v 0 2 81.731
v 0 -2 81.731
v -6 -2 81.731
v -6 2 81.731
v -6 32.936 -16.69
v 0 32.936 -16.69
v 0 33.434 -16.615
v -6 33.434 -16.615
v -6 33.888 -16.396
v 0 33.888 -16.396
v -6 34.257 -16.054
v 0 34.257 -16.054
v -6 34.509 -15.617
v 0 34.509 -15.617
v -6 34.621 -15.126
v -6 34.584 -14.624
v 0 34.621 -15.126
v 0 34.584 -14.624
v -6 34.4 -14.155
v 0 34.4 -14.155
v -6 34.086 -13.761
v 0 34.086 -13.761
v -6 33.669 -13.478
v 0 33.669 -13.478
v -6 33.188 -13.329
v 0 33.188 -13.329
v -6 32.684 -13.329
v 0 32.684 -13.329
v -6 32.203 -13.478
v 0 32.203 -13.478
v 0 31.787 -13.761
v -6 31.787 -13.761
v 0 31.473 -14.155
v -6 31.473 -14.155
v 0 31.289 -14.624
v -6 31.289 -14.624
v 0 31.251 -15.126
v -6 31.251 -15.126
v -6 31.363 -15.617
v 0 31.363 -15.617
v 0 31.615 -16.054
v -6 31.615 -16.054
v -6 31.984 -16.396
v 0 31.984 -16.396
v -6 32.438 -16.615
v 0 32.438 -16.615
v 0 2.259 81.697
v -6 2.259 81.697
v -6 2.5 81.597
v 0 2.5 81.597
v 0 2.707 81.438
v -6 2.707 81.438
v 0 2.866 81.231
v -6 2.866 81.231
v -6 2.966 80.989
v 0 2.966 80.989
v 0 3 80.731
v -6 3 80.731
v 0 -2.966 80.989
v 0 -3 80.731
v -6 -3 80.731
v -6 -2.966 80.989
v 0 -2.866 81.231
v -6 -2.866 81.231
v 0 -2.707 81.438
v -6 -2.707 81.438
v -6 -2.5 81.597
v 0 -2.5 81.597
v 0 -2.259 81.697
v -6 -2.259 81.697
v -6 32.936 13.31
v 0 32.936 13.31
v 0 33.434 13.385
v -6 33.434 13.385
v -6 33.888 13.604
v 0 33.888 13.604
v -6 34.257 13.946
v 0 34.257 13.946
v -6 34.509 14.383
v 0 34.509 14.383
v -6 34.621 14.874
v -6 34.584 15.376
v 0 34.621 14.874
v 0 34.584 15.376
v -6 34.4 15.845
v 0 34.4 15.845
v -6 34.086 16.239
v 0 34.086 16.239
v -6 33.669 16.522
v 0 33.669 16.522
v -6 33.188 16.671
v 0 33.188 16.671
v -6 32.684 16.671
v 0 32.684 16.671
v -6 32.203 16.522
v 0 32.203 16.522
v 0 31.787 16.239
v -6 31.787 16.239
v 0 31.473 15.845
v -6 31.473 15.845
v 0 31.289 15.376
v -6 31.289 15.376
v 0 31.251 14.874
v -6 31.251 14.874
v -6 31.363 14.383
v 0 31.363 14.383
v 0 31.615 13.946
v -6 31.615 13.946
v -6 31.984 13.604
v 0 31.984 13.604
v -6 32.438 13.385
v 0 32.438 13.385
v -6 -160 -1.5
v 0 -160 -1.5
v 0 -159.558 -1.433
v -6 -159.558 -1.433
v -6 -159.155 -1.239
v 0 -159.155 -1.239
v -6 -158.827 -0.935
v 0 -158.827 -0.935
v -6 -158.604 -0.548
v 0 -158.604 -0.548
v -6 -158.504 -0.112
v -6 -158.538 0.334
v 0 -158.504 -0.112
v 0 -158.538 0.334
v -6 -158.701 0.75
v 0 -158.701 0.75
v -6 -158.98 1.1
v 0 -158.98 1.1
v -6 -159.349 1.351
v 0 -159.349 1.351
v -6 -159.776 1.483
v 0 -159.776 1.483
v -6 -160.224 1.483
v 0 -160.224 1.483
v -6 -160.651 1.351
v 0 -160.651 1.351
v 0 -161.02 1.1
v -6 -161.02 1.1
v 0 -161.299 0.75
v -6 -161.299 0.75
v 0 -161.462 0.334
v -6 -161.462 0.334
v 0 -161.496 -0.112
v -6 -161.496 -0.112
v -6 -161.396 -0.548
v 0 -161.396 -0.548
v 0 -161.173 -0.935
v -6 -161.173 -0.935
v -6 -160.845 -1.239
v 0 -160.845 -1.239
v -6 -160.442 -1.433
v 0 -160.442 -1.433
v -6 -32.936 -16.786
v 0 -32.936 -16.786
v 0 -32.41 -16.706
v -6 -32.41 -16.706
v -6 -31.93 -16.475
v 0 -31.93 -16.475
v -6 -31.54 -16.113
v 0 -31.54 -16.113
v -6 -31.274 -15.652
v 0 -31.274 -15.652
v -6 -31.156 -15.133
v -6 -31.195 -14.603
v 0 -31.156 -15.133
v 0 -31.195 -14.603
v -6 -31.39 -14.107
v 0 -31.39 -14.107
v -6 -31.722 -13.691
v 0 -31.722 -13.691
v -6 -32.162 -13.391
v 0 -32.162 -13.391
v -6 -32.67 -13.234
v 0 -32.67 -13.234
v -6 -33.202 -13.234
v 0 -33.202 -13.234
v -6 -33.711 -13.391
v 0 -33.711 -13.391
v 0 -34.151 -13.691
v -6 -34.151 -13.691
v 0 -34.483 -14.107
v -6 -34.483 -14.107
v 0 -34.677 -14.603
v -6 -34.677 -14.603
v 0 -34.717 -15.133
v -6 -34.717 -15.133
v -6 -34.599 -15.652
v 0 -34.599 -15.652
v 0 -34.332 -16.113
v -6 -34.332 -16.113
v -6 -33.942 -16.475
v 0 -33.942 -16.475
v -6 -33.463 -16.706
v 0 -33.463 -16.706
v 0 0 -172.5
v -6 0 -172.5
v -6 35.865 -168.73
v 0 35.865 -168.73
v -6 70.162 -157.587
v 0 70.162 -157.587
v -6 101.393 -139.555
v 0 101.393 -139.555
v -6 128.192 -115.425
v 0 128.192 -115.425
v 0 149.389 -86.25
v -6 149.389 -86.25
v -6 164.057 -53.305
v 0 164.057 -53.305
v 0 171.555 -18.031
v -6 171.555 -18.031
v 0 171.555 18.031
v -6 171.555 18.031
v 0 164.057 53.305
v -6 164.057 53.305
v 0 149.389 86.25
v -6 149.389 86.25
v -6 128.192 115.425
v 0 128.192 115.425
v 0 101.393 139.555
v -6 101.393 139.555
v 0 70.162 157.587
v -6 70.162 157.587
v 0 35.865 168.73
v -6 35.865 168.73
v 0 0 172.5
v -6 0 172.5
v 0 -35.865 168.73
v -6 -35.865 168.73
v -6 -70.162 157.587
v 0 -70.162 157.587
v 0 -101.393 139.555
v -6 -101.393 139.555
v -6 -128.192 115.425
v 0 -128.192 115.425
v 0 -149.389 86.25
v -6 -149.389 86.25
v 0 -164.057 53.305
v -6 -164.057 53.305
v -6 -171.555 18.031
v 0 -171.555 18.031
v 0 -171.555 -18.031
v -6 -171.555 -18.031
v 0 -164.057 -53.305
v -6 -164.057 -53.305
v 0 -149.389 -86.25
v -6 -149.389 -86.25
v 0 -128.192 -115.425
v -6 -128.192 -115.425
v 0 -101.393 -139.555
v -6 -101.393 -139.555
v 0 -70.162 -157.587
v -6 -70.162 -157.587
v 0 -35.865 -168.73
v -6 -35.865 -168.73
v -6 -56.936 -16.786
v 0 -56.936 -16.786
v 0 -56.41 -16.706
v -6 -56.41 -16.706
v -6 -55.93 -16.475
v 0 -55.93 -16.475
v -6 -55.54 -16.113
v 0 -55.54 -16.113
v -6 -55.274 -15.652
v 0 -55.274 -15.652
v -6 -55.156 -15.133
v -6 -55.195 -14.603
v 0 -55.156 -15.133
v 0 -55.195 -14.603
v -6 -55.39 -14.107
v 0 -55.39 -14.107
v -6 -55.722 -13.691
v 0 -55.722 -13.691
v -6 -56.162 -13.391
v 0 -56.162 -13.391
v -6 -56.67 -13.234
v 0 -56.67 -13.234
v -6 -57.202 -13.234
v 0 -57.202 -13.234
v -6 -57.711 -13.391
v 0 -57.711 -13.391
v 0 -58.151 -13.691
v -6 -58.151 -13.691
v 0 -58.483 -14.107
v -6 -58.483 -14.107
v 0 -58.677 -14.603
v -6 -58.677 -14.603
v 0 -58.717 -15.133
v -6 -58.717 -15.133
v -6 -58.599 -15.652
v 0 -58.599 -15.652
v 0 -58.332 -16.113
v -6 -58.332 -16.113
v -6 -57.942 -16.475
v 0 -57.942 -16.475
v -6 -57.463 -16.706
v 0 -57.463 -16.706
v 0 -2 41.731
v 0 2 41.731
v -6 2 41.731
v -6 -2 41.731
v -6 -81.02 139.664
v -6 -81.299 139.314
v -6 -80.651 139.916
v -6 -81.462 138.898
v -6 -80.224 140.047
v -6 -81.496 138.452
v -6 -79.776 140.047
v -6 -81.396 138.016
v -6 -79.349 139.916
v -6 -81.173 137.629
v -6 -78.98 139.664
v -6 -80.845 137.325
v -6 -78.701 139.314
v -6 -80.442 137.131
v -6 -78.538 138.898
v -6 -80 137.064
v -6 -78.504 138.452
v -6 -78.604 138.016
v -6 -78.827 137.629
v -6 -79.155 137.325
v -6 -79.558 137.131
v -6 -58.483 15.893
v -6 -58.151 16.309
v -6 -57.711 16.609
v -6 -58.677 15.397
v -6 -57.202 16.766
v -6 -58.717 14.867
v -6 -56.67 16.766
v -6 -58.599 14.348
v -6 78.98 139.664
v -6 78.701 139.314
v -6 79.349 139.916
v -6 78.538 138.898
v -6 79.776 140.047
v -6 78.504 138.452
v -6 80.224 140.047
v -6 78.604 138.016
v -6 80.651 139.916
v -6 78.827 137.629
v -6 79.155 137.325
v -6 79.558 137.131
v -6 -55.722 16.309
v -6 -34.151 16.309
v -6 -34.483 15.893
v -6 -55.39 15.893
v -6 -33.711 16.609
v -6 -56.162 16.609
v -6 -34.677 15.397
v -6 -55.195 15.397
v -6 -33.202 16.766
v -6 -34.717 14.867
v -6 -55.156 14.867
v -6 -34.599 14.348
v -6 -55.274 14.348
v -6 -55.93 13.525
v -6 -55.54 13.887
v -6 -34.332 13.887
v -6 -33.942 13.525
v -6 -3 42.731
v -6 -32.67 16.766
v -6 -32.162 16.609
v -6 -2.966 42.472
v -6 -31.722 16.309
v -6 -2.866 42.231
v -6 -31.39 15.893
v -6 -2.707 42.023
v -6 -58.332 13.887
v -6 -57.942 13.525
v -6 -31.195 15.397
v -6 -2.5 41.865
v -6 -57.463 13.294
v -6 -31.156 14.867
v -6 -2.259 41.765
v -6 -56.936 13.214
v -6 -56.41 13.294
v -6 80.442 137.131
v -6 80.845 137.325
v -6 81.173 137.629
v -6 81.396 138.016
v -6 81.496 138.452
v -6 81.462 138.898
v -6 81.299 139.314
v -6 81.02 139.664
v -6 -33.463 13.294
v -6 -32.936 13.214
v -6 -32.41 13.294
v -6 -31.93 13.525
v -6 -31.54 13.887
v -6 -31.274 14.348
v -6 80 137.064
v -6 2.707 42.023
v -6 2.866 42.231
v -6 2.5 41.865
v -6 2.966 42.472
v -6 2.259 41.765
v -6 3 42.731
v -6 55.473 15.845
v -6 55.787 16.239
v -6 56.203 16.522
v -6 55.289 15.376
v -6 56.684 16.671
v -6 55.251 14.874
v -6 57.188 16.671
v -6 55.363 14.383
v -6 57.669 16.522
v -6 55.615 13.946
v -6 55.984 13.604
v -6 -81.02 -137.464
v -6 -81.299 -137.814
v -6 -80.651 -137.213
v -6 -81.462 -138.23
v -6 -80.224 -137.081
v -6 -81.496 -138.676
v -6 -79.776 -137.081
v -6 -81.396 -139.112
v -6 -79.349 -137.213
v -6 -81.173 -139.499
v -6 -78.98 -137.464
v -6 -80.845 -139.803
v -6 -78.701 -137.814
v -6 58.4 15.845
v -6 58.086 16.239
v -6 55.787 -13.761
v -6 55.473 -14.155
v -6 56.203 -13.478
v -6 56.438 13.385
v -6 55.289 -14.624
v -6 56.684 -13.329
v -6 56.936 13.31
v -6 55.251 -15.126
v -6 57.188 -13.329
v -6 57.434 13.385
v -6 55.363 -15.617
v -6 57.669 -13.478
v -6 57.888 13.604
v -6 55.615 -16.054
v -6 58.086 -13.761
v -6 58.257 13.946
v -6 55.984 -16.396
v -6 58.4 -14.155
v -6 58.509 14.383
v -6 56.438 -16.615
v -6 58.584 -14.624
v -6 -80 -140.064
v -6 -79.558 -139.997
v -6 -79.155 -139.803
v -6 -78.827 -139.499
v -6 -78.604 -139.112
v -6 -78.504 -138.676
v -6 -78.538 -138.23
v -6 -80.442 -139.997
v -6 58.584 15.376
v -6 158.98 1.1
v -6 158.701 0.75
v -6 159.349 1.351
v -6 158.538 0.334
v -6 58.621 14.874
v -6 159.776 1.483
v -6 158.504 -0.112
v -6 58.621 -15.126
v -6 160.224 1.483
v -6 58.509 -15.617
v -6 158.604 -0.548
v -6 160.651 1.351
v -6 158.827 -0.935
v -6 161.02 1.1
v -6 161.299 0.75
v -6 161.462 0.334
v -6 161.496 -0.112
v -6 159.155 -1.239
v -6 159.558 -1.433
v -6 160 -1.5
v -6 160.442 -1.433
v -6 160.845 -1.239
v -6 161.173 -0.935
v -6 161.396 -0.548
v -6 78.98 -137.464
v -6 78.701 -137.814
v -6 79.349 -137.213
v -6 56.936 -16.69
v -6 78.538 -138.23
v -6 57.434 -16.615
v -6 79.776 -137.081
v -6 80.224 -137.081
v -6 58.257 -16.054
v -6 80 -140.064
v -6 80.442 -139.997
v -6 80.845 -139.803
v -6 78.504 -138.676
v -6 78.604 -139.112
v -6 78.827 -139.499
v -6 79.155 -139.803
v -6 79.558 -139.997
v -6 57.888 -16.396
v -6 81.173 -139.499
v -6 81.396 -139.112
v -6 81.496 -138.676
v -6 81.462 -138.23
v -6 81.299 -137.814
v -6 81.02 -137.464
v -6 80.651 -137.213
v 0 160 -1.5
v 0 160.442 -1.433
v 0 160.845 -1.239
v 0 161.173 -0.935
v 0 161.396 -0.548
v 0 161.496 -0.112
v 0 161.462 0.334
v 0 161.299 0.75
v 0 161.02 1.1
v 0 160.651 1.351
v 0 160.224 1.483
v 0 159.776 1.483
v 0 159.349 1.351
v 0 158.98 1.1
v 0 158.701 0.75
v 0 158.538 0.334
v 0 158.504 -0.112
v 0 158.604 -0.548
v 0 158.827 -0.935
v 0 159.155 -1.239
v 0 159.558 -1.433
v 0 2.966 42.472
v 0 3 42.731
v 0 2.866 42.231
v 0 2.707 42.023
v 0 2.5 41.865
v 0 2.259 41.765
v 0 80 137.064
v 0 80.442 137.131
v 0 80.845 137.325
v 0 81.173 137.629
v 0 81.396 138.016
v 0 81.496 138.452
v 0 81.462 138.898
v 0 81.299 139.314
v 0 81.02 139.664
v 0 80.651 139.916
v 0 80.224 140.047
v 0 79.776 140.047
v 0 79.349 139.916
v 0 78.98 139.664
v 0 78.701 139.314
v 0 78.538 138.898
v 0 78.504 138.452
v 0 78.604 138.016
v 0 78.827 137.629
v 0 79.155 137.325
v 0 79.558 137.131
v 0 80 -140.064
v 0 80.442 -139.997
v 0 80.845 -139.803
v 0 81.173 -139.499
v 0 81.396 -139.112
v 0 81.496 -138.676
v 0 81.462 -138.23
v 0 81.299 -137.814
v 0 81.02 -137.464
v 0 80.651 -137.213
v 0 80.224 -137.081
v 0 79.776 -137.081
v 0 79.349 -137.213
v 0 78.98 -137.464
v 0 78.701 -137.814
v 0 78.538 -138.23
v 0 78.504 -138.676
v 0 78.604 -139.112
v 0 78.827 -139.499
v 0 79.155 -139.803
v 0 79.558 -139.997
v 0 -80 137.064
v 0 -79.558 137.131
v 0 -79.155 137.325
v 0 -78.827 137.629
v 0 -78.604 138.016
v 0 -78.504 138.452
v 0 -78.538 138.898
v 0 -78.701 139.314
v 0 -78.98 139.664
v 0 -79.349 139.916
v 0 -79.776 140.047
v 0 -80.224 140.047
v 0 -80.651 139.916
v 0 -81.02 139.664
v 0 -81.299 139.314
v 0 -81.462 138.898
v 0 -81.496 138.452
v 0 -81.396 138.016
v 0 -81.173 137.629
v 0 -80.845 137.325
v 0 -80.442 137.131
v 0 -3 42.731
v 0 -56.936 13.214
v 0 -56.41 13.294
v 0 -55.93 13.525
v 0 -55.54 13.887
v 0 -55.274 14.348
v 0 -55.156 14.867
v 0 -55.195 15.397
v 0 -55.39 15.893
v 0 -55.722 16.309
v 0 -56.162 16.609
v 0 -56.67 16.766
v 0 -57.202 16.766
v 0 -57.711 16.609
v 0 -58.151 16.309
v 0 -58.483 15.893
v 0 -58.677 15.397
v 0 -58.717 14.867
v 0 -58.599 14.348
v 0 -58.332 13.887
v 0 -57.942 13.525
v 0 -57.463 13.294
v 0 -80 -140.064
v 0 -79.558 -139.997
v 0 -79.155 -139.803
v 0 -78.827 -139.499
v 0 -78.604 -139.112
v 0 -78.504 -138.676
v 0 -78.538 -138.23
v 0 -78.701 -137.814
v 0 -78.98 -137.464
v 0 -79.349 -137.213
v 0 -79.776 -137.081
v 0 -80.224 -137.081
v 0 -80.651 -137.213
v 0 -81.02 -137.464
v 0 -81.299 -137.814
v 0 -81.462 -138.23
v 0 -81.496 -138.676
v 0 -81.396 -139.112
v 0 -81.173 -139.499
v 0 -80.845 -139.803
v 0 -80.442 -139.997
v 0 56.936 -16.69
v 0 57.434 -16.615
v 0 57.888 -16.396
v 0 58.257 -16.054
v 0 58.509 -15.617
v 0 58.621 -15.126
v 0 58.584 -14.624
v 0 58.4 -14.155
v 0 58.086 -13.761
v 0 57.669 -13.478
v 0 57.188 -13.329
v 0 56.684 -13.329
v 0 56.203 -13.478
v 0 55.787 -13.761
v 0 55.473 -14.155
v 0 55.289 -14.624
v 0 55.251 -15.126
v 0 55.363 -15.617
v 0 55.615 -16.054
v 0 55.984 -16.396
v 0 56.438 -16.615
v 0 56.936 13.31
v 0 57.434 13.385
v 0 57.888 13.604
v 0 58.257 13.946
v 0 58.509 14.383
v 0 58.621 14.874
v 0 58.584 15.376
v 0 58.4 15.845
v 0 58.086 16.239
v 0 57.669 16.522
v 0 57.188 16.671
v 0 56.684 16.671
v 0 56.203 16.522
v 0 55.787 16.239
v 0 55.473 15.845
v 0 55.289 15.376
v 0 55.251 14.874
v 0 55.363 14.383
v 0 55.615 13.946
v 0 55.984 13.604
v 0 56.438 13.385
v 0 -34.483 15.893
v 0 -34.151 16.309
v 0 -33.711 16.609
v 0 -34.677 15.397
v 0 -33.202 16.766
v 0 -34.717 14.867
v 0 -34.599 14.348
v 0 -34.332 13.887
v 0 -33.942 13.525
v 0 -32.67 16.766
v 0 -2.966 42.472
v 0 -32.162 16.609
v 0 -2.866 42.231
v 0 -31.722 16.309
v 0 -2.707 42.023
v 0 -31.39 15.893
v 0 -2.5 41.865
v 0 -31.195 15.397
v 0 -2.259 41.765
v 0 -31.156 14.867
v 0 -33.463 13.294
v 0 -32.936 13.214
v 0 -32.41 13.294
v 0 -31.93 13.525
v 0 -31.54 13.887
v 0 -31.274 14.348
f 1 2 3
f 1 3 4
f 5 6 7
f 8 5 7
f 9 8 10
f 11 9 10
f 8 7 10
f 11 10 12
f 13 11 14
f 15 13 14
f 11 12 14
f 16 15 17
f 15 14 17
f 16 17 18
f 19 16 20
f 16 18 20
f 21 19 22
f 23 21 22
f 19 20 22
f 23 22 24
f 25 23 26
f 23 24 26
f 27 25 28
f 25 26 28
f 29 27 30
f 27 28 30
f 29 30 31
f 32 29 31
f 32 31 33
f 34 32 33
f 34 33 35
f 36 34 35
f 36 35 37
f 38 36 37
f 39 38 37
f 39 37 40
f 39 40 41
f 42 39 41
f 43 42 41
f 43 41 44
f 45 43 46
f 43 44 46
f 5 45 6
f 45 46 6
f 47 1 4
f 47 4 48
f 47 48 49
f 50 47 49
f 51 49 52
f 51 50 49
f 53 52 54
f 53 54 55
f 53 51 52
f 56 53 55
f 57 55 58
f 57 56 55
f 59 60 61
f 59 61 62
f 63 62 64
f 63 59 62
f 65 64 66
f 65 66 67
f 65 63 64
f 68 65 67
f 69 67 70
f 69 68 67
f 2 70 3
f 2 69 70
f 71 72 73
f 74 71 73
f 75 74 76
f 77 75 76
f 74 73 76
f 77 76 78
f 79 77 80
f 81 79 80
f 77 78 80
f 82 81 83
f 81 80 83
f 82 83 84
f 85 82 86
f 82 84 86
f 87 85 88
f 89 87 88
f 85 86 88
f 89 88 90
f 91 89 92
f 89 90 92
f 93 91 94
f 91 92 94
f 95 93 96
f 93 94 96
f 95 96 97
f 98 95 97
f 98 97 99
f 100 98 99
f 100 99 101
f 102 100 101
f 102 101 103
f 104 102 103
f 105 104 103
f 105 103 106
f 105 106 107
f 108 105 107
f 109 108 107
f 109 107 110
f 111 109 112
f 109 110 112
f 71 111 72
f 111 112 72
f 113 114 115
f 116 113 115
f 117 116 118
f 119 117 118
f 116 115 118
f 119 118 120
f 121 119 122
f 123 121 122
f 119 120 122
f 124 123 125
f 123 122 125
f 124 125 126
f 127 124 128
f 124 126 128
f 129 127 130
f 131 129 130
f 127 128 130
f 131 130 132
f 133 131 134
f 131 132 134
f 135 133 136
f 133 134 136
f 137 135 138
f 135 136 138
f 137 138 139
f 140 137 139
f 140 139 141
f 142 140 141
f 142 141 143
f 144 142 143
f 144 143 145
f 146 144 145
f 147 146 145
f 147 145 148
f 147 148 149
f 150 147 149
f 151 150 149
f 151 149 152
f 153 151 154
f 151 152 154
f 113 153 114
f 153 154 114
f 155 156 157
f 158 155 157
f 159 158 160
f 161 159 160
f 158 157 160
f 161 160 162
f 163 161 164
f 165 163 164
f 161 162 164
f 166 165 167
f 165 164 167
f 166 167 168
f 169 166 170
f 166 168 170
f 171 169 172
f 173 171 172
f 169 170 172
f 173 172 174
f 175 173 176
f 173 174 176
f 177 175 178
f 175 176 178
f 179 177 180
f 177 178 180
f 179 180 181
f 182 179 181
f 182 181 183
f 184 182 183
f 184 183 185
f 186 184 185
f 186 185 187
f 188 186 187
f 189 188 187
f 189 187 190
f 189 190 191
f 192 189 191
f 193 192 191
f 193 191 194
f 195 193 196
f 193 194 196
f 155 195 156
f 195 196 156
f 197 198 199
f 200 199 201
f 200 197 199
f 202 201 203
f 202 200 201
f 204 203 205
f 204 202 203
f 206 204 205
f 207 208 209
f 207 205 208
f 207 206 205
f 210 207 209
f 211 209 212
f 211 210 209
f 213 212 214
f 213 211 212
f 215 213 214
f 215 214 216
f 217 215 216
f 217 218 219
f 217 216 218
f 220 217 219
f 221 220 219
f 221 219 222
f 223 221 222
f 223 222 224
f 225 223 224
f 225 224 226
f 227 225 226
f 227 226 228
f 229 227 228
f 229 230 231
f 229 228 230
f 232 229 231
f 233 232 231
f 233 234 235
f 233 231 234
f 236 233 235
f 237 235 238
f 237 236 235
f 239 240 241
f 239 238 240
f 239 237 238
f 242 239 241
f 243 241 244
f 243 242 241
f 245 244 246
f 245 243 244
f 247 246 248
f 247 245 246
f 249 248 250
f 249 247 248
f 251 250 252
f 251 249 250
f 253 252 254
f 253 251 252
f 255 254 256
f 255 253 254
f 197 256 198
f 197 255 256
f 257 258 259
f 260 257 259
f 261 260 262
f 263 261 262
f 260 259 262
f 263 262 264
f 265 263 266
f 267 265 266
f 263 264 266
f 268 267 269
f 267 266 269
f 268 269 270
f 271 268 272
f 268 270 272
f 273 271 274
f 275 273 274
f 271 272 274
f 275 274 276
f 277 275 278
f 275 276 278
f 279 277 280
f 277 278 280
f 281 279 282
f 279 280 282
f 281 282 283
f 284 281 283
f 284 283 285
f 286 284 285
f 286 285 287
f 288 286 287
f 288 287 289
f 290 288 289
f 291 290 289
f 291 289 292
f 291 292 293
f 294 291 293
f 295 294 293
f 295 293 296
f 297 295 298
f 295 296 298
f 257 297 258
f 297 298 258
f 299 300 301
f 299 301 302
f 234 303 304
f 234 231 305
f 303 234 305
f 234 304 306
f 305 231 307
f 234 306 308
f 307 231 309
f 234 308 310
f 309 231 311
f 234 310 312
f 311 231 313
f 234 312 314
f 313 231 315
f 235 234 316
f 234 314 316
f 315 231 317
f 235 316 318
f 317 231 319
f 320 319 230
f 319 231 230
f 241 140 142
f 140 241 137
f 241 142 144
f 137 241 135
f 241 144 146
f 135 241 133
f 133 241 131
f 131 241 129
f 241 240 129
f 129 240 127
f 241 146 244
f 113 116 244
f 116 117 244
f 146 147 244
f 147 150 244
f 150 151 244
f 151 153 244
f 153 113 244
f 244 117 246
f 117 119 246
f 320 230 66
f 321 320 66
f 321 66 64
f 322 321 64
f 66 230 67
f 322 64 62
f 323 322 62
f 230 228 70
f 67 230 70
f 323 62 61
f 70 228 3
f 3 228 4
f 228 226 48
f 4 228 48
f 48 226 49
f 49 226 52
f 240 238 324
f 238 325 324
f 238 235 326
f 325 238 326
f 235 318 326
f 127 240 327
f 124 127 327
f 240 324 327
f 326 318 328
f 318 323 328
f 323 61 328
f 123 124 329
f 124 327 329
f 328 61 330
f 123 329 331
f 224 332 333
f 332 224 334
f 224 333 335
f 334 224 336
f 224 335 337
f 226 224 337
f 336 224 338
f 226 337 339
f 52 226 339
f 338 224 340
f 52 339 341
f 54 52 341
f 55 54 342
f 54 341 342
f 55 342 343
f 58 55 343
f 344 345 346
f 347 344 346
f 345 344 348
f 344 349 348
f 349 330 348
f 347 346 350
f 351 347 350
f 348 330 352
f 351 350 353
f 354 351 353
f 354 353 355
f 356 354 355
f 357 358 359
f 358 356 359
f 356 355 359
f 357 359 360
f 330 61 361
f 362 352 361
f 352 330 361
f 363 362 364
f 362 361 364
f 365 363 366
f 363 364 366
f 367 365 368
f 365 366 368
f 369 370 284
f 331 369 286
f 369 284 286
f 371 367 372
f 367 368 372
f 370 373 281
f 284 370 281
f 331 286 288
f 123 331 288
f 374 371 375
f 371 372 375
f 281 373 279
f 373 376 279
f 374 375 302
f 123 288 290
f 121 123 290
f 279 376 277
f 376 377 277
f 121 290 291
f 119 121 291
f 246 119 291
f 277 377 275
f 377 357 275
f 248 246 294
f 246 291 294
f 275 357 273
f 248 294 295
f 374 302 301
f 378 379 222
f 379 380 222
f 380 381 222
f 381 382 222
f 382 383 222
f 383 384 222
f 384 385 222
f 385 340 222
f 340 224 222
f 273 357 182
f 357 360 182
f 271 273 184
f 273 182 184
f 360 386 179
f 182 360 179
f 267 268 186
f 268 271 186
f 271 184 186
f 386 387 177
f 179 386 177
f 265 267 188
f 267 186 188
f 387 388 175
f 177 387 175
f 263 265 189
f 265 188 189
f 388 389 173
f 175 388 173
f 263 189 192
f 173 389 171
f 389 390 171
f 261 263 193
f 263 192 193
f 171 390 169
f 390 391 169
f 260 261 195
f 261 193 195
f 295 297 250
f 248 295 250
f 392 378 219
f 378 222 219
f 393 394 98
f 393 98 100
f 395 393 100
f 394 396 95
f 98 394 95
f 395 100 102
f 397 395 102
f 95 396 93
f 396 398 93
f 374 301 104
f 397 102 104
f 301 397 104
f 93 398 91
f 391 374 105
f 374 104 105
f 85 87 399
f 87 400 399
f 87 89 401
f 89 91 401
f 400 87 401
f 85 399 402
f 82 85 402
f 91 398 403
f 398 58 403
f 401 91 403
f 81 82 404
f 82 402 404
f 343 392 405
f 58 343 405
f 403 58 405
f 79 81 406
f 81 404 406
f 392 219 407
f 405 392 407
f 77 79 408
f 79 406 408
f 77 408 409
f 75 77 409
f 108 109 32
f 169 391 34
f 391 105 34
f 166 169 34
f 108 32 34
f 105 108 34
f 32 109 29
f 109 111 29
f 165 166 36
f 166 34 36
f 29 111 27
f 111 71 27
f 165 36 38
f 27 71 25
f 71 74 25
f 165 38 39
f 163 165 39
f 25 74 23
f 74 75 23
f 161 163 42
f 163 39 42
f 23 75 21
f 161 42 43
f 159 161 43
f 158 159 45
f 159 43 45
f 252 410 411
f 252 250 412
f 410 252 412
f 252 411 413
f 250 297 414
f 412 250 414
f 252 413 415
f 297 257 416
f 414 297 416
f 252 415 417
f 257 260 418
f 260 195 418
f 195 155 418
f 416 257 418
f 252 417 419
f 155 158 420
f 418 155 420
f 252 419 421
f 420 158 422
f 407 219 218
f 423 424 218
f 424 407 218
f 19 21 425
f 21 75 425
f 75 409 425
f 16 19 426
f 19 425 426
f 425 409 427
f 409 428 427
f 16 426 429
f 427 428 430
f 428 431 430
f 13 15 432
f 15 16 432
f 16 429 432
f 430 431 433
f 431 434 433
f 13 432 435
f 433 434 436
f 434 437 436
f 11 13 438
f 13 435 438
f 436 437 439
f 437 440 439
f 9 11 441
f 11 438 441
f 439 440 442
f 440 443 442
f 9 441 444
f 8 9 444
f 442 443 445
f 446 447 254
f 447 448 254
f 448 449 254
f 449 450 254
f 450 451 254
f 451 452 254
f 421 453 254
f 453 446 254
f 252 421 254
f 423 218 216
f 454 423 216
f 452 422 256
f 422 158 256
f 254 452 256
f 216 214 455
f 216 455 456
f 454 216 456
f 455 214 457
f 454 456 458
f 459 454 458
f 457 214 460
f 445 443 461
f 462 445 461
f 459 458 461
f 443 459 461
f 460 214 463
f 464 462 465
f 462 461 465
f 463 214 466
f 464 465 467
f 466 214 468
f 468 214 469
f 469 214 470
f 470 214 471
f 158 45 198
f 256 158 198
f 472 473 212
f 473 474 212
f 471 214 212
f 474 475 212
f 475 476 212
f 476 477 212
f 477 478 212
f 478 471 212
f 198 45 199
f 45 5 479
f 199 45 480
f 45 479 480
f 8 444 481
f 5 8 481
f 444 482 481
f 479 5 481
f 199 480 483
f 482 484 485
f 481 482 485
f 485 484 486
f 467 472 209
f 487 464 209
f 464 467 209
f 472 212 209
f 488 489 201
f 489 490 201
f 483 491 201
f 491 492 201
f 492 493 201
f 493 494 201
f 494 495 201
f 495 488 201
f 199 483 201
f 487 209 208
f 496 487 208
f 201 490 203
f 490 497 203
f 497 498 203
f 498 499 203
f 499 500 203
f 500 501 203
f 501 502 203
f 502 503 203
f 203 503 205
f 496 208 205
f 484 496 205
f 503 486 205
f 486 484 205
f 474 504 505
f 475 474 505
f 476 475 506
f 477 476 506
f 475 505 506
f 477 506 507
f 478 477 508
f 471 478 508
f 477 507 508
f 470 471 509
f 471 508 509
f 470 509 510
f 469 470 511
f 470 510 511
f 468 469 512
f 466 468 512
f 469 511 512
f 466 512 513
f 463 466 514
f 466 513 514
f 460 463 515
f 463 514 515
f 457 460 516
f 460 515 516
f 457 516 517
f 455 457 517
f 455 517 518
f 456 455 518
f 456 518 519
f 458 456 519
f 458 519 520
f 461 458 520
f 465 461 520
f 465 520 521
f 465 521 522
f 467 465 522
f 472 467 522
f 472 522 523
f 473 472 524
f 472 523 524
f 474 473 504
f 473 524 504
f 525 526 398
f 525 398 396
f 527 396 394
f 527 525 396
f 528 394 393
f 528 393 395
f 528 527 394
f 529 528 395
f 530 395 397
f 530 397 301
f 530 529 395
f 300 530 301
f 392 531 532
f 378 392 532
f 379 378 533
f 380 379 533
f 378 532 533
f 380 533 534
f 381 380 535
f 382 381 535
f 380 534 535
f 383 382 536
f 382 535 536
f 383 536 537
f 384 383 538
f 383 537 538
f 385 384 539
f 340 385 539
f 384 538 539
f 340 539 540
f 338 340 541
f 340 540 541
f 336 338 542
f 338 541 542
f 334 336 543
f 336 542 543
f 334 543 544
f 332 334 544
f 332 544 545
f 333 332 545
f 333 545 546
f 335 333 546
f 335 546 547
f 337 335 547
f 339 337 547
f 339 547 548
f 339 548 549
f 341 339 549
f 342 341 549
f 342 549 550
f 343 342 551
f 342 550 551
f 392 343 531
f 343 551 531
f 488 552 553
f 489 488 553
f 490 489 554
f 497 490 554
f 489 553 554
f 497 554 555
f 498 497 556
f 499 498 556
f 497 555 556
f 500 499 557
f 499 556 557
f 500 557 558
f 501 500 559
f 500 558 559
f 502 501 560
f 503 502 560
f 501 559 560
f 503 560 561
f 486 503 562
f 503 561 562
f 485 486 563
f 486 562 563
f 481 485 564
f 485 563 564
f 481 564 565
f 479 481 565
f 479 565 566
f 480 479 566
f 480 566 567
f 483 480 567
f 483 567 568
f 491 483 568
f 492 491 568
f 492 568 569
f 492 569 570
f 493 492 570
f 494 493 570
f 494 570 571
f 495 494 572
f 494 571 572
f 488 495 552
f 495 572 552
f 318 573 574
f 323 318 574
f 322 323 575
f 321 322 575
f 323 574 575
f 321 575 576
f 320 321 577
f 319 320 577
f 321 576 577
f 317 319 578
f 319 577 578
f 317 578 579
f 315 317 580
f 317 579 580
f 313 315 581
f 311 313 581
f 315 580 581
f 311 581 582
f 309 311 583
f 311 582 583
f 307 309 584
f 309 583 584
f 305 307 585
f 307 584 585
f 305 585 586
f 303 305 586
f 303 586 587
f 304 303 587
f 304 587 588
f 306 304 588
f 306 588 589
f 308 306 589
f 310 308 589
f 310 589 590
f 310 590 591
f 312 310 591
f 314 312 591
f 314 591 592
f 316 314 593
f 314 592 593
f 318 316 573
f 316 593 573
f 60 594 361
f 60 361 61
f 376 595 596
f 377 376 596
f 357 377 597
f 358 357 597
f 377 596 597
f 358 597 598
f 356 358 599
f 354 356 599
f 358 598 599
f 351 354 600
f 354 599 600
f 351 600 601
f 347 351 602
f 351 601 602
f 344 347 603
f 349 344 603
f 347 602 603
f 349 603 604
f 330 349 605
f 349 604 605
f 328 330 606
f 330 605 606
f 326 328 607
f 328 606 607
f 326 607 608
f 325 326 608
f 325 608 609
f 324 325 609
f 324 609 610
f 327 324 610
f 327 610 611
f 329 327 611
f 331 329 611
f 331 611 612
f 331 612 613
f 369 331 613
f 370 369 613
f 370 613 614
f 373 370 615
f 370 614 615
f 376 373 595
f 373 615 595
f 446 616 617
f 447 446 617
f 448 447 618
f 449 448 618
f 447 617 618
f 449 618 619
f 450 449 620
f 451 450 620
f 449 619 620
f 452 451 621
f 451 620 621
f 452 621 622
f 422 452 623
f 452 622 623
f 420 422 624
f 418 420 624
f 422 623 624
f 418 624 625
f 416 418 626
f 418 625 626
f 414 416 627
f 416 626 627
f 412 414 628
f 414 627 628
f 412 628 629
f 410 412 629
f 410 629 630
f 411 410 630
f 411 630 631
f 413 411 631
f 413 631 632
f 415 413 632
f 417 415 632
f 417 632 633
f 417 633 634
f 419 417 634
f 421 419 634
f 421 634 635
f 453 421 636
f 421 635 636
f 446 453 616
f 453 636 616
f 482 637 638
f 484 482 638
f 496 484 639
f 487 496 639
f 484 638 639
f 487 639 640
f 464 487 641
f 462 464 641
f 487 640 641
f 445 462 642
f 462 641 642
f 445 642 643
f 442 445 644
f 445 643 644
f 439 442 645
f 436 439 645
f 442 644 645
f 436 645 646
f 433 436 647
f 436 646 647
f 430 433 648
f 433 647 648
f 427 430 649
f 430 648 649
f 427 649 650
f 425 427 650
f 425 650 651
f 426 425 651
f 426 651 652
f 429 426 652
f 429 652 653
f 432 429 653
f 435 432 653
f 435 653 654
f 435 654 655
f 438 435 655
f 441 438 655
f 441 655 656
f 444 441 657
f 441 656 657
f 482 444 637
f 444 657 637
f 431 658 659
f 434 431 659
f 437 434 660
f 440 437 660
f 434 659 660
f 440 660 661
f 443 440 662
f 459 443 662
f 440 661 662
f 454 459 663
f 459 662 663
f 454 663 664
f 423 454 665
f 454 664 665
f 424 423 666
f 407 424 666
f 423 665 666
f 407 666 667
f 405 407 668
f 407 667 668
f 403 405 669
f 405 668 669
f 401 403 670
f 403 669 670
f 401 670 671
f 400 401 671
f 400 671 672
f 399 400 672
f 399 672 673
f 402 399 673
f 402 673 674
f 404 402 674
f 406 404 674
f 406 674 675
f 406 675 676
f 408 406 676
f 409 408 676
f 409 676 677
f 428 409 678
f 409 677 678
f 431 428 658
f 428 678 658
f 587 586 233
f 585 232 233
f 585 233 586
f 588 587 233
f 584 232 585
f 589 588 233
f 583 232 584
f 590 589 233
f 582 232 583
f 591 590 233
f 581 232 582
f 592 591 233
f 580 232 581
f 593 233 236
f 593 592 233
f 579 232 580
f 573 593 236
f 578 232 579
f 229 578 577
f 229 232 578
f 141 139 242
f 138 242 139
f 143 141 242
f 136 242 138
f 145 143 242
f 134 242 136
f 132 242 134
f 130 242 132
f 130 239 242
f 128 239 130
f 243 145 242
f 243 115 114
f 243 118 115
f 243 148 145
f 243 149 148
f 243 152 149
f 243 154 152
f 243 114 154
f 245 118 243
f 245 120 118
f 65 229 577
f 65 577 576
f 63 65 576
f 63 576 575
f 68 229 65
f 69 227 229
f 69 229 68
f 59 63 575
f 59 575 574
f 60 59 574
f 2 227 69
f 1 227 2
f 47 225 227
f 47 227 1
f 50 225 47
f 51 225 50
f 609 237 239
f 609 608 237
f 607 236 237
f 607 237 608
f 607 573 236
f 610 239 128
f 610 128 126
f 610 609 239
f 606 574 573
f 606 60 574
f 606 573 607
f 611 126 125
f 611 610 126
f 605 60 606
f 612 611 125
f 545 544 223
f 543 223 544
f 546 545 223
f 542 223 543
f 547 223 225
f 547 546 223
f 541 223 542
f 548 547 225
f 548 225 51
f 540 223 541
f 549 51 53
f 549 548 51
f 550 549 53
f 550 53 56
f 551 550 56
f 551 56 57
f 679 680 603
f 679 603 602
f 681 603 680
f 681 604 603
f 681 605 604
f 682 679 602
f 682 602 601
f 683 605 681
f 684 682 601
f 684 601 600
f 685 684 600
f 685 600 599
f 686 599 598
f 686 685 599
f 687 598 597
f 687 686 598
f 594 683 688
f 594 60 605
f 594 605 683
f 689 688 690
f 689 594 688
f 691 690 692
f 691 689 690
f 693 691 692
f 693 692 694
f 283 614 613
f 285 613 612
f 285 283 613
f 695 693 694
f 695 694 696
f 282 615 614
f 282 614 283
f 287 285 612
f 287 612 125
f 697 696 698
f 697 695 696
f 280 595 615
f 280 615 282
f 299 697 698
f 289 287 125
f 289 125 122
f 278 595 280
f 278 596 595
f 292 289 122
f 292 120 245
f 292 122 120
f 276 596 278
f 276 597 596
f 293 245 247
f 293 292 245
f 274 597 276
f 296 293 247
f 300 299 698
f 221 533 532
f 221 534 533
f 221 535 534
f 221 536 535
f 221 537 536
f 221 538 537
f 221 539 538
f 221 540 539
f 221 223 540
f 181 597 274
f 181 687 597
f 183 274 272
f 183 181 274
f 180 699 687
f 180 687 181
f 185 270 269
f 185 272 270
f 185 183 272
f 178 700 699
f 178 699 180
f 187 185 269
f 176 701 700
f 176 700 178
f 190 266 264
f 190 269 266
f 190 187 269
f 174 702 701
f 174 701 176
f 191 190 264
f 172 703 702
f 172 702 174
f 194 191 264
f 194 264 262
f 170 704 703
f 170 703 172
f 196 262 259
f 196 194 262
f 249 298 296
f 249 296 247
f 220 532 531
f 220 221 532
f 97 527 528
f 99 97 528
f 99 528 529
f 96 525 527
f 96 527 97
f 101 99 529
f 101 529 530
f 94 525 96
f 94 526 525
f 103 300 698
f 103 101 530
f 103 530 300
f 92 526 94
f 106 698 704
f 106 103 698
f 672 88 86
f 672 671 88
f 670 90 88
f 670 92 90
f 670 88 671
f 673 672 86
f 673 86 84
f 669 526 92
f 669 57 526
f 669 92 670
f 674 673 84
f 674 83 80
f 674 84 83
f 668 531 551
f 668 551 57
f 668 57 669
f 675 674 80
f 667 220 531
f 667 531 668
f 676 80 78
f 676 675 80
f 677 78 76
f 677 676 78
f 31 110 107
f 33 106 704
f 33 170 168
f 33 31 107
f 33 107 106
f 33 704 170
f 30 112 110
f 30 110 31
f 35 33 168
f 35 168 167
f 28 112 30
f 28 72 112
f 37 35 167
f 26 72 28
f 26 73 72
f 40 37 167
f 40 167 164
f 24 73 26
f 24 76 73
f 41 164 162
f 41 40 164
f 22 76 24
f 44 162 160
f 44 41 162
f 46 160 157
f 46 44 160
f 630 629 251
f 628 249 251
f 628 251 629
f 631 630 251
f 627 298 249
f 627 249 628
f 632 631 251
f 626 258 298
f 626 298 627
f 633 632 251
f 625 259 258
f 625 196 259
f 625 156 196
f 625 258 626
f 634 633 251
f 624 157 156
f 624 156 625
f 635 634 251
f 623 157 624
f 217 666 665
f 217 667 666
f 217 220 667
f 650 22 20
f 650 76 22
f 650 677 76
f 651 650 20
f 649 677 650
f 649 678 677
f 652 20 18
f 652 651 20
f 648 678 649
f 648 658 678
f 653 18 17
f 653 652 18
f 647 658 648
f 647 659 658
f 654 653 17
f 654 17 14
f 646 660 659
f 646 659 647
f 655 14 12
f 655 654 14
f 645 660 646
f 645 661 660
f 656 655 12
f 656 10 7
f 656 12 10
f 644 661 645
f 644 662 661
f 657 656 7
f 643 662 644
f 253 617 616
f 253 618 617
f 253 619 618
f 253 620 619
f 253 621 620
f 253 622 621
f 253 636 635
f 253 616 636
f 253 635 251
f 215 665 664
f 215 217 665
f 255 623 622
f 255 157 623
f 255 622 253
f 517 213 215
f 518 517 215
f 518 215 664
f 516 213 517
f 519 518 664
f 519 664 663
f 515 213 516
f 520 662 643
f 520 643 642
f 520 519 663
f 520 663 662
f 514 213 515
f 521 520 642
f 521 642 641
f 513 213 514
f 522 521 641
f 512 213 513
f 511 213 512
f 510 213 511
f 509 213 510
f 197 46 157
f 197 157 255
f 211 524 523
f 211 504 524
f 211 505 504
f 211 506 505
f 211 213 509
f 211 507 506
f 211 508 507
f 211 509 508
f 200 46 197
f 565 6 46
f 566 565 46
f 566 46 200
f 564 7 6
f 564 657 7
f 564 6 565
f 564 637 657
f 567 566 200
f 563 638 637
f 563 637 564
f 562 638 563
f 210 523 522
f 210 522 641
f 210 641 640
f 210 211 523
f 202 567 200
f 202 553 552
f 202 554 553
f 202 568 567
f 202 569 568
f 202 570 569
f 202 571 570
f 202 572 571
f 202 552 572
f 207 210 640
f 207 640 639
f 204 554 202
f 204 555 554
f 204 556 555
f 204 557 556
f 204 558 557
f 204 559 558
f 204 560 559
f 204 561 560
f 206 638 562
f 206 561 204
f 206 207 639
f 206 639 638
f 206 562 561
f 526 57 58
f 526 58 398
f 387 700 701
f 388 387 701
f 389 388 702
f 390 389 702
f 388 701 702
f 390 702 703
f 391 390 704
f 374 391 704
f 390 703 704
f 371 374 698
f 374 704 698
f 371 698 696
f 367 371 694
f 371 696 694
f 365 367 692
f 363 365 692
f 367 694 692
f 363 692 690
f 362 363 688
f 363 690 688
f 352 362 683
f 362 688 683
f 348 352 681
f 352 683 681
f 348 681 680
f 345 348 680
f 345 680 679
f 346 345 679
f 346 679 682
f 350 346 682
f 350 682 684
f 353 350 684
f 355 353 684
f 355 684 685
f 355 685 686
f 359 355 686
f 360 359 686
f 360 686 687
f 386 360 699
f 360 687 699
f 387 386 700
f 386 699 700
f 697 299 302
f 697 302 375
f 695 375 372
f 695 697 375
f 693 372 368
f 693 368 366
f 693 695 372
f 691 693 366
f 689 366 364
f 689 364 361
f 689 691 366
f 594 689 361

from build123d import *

# Parameters (mm, degrees)
SKETCH_1_R      = 1.5
SKETCH_1_R_2    = 1.785756588
SKETCH_1_R_3    = 1.689732538
EXTRUDE_1_DEPTH = 6


with BuildPart() as part:
    # 草图1 → 凸台-拉伸1 (new body)
    # profile 1 of 2: a face of its own
    with BuildSketch(Plane(origin=(0, 0, 0), x_dir=(0, 0, -1), z_dir=(1, 0, 0))):
        with BuildLine():
            ThreePointArc((-172.5, 0), (0, -172.5), (172.5, 0))
            Line((172.5, 0), (-41.730591699, 0))
            Line((-41.730591699, 0), (-41.730591699, -2))
            ThreePointArc((-41.730591699, -2), (-42.023484918, -2.707106781), (-42.730591699, -3))
            Line((-42.730591699, -3), (-80.730591699, -3))
            ThreePointArc((-80.730591699, -3), (-81.43769848, -2.707106781), (-81.730591699, -2))
            Line((-81.730591699, -2), (-81.730591699, 0))
            Line((-81.730591699, 0), (-172.5, 0))
        make_face()
        with Locations((-138.564064605, -80)):
            Circle(SKETCH_1_R, mode=Mode.SUBTRACT)
        with Locations((-15, -56.936329309)):
            Circle(SKETCH_1_R_2, mode=Mode.SUBTRACT)
        with Locations((-15, -32.936329309)):
            Circle(SKETCH_1_R_2, mode=Mode.SUBTRACT)
        with Locations((0, -160)):
            Circle(SKETCH_1_R, mode=Mode.SUBTRACT)
        with Locations((15, -56.936329309)):
            Circle(SKETCH_1_R_2, mode=Mode.SUBTRACT)
        with Locations((15, -32.936329309)):
            Circle(SKETCH_1_R_2, mode=Mode.SUBTRACT)
        with Locations((138.564064606, -80)):
            Circle(SKETCH_1_R, mode=Mode.SUBTRACT)
    # profile 2 of 2: a face of its own
    with BuildSketch(Plane(origin=(0, 0, 0), x_dir=(0, 0, -1), z_dir=(1, 0, 0))):
        with BuildLine():
            Line((-41.730591699, 0), (172.5, 0))
            ThreePointArc((172.5, 0), (0, 172.5), (-172.5, 0))
            Line((-172.5, 0), (-81.730591699, 0))
            Line((-81.730591699, 0), (-81.730591699, 2))
            ThreePointArc((-81.730591699, 2), (-81.43769848, 2.707106781), (-80.730591699, 3))
            Line((-80.730591699, 3), (-42.730591699, 3))
            ThreePointArc((-42.730591699, 3), (-42.023484918, 2.707106781), (-41.730591699, 2))
            Line((-41.730591699, 2), (-41.730591699, 0))
        make_face()
        with Locations((-138.564064605, 80)):
            Circle(SKETCH_1_R, mode=Mode.SUBTRACT)
        with Locations((-15, 32.936329309)):
            Circle(SKETCH_1_R_3, mode=Mode.SUBTRACT)
        with Locations((-15, 56.936329309)):
            Circle(SKETCH_1_R_3, mode=Mode.SUBTRACT)
        with Locations((0, 160)):
            Circle(SKETCH_1_R, mode=Mode.SUBTRACT)
        with Locations((15, 32.936329309)):
            Circle(SKETCH_1_R_3, mode=Mode.SUBTRACT)
        with Locations((15, 56.936329309)):
            Circle(SKETCH_1_R_3, mode=Mode.SUBTRACT)
        with Locations((138.564064606, 80)):
            Circle(SKETCH_1_R, mode=Mode.SUBTRACT)
    extrude(amount=-EXTRUDE_1_DEPTH)


solid = part.part
